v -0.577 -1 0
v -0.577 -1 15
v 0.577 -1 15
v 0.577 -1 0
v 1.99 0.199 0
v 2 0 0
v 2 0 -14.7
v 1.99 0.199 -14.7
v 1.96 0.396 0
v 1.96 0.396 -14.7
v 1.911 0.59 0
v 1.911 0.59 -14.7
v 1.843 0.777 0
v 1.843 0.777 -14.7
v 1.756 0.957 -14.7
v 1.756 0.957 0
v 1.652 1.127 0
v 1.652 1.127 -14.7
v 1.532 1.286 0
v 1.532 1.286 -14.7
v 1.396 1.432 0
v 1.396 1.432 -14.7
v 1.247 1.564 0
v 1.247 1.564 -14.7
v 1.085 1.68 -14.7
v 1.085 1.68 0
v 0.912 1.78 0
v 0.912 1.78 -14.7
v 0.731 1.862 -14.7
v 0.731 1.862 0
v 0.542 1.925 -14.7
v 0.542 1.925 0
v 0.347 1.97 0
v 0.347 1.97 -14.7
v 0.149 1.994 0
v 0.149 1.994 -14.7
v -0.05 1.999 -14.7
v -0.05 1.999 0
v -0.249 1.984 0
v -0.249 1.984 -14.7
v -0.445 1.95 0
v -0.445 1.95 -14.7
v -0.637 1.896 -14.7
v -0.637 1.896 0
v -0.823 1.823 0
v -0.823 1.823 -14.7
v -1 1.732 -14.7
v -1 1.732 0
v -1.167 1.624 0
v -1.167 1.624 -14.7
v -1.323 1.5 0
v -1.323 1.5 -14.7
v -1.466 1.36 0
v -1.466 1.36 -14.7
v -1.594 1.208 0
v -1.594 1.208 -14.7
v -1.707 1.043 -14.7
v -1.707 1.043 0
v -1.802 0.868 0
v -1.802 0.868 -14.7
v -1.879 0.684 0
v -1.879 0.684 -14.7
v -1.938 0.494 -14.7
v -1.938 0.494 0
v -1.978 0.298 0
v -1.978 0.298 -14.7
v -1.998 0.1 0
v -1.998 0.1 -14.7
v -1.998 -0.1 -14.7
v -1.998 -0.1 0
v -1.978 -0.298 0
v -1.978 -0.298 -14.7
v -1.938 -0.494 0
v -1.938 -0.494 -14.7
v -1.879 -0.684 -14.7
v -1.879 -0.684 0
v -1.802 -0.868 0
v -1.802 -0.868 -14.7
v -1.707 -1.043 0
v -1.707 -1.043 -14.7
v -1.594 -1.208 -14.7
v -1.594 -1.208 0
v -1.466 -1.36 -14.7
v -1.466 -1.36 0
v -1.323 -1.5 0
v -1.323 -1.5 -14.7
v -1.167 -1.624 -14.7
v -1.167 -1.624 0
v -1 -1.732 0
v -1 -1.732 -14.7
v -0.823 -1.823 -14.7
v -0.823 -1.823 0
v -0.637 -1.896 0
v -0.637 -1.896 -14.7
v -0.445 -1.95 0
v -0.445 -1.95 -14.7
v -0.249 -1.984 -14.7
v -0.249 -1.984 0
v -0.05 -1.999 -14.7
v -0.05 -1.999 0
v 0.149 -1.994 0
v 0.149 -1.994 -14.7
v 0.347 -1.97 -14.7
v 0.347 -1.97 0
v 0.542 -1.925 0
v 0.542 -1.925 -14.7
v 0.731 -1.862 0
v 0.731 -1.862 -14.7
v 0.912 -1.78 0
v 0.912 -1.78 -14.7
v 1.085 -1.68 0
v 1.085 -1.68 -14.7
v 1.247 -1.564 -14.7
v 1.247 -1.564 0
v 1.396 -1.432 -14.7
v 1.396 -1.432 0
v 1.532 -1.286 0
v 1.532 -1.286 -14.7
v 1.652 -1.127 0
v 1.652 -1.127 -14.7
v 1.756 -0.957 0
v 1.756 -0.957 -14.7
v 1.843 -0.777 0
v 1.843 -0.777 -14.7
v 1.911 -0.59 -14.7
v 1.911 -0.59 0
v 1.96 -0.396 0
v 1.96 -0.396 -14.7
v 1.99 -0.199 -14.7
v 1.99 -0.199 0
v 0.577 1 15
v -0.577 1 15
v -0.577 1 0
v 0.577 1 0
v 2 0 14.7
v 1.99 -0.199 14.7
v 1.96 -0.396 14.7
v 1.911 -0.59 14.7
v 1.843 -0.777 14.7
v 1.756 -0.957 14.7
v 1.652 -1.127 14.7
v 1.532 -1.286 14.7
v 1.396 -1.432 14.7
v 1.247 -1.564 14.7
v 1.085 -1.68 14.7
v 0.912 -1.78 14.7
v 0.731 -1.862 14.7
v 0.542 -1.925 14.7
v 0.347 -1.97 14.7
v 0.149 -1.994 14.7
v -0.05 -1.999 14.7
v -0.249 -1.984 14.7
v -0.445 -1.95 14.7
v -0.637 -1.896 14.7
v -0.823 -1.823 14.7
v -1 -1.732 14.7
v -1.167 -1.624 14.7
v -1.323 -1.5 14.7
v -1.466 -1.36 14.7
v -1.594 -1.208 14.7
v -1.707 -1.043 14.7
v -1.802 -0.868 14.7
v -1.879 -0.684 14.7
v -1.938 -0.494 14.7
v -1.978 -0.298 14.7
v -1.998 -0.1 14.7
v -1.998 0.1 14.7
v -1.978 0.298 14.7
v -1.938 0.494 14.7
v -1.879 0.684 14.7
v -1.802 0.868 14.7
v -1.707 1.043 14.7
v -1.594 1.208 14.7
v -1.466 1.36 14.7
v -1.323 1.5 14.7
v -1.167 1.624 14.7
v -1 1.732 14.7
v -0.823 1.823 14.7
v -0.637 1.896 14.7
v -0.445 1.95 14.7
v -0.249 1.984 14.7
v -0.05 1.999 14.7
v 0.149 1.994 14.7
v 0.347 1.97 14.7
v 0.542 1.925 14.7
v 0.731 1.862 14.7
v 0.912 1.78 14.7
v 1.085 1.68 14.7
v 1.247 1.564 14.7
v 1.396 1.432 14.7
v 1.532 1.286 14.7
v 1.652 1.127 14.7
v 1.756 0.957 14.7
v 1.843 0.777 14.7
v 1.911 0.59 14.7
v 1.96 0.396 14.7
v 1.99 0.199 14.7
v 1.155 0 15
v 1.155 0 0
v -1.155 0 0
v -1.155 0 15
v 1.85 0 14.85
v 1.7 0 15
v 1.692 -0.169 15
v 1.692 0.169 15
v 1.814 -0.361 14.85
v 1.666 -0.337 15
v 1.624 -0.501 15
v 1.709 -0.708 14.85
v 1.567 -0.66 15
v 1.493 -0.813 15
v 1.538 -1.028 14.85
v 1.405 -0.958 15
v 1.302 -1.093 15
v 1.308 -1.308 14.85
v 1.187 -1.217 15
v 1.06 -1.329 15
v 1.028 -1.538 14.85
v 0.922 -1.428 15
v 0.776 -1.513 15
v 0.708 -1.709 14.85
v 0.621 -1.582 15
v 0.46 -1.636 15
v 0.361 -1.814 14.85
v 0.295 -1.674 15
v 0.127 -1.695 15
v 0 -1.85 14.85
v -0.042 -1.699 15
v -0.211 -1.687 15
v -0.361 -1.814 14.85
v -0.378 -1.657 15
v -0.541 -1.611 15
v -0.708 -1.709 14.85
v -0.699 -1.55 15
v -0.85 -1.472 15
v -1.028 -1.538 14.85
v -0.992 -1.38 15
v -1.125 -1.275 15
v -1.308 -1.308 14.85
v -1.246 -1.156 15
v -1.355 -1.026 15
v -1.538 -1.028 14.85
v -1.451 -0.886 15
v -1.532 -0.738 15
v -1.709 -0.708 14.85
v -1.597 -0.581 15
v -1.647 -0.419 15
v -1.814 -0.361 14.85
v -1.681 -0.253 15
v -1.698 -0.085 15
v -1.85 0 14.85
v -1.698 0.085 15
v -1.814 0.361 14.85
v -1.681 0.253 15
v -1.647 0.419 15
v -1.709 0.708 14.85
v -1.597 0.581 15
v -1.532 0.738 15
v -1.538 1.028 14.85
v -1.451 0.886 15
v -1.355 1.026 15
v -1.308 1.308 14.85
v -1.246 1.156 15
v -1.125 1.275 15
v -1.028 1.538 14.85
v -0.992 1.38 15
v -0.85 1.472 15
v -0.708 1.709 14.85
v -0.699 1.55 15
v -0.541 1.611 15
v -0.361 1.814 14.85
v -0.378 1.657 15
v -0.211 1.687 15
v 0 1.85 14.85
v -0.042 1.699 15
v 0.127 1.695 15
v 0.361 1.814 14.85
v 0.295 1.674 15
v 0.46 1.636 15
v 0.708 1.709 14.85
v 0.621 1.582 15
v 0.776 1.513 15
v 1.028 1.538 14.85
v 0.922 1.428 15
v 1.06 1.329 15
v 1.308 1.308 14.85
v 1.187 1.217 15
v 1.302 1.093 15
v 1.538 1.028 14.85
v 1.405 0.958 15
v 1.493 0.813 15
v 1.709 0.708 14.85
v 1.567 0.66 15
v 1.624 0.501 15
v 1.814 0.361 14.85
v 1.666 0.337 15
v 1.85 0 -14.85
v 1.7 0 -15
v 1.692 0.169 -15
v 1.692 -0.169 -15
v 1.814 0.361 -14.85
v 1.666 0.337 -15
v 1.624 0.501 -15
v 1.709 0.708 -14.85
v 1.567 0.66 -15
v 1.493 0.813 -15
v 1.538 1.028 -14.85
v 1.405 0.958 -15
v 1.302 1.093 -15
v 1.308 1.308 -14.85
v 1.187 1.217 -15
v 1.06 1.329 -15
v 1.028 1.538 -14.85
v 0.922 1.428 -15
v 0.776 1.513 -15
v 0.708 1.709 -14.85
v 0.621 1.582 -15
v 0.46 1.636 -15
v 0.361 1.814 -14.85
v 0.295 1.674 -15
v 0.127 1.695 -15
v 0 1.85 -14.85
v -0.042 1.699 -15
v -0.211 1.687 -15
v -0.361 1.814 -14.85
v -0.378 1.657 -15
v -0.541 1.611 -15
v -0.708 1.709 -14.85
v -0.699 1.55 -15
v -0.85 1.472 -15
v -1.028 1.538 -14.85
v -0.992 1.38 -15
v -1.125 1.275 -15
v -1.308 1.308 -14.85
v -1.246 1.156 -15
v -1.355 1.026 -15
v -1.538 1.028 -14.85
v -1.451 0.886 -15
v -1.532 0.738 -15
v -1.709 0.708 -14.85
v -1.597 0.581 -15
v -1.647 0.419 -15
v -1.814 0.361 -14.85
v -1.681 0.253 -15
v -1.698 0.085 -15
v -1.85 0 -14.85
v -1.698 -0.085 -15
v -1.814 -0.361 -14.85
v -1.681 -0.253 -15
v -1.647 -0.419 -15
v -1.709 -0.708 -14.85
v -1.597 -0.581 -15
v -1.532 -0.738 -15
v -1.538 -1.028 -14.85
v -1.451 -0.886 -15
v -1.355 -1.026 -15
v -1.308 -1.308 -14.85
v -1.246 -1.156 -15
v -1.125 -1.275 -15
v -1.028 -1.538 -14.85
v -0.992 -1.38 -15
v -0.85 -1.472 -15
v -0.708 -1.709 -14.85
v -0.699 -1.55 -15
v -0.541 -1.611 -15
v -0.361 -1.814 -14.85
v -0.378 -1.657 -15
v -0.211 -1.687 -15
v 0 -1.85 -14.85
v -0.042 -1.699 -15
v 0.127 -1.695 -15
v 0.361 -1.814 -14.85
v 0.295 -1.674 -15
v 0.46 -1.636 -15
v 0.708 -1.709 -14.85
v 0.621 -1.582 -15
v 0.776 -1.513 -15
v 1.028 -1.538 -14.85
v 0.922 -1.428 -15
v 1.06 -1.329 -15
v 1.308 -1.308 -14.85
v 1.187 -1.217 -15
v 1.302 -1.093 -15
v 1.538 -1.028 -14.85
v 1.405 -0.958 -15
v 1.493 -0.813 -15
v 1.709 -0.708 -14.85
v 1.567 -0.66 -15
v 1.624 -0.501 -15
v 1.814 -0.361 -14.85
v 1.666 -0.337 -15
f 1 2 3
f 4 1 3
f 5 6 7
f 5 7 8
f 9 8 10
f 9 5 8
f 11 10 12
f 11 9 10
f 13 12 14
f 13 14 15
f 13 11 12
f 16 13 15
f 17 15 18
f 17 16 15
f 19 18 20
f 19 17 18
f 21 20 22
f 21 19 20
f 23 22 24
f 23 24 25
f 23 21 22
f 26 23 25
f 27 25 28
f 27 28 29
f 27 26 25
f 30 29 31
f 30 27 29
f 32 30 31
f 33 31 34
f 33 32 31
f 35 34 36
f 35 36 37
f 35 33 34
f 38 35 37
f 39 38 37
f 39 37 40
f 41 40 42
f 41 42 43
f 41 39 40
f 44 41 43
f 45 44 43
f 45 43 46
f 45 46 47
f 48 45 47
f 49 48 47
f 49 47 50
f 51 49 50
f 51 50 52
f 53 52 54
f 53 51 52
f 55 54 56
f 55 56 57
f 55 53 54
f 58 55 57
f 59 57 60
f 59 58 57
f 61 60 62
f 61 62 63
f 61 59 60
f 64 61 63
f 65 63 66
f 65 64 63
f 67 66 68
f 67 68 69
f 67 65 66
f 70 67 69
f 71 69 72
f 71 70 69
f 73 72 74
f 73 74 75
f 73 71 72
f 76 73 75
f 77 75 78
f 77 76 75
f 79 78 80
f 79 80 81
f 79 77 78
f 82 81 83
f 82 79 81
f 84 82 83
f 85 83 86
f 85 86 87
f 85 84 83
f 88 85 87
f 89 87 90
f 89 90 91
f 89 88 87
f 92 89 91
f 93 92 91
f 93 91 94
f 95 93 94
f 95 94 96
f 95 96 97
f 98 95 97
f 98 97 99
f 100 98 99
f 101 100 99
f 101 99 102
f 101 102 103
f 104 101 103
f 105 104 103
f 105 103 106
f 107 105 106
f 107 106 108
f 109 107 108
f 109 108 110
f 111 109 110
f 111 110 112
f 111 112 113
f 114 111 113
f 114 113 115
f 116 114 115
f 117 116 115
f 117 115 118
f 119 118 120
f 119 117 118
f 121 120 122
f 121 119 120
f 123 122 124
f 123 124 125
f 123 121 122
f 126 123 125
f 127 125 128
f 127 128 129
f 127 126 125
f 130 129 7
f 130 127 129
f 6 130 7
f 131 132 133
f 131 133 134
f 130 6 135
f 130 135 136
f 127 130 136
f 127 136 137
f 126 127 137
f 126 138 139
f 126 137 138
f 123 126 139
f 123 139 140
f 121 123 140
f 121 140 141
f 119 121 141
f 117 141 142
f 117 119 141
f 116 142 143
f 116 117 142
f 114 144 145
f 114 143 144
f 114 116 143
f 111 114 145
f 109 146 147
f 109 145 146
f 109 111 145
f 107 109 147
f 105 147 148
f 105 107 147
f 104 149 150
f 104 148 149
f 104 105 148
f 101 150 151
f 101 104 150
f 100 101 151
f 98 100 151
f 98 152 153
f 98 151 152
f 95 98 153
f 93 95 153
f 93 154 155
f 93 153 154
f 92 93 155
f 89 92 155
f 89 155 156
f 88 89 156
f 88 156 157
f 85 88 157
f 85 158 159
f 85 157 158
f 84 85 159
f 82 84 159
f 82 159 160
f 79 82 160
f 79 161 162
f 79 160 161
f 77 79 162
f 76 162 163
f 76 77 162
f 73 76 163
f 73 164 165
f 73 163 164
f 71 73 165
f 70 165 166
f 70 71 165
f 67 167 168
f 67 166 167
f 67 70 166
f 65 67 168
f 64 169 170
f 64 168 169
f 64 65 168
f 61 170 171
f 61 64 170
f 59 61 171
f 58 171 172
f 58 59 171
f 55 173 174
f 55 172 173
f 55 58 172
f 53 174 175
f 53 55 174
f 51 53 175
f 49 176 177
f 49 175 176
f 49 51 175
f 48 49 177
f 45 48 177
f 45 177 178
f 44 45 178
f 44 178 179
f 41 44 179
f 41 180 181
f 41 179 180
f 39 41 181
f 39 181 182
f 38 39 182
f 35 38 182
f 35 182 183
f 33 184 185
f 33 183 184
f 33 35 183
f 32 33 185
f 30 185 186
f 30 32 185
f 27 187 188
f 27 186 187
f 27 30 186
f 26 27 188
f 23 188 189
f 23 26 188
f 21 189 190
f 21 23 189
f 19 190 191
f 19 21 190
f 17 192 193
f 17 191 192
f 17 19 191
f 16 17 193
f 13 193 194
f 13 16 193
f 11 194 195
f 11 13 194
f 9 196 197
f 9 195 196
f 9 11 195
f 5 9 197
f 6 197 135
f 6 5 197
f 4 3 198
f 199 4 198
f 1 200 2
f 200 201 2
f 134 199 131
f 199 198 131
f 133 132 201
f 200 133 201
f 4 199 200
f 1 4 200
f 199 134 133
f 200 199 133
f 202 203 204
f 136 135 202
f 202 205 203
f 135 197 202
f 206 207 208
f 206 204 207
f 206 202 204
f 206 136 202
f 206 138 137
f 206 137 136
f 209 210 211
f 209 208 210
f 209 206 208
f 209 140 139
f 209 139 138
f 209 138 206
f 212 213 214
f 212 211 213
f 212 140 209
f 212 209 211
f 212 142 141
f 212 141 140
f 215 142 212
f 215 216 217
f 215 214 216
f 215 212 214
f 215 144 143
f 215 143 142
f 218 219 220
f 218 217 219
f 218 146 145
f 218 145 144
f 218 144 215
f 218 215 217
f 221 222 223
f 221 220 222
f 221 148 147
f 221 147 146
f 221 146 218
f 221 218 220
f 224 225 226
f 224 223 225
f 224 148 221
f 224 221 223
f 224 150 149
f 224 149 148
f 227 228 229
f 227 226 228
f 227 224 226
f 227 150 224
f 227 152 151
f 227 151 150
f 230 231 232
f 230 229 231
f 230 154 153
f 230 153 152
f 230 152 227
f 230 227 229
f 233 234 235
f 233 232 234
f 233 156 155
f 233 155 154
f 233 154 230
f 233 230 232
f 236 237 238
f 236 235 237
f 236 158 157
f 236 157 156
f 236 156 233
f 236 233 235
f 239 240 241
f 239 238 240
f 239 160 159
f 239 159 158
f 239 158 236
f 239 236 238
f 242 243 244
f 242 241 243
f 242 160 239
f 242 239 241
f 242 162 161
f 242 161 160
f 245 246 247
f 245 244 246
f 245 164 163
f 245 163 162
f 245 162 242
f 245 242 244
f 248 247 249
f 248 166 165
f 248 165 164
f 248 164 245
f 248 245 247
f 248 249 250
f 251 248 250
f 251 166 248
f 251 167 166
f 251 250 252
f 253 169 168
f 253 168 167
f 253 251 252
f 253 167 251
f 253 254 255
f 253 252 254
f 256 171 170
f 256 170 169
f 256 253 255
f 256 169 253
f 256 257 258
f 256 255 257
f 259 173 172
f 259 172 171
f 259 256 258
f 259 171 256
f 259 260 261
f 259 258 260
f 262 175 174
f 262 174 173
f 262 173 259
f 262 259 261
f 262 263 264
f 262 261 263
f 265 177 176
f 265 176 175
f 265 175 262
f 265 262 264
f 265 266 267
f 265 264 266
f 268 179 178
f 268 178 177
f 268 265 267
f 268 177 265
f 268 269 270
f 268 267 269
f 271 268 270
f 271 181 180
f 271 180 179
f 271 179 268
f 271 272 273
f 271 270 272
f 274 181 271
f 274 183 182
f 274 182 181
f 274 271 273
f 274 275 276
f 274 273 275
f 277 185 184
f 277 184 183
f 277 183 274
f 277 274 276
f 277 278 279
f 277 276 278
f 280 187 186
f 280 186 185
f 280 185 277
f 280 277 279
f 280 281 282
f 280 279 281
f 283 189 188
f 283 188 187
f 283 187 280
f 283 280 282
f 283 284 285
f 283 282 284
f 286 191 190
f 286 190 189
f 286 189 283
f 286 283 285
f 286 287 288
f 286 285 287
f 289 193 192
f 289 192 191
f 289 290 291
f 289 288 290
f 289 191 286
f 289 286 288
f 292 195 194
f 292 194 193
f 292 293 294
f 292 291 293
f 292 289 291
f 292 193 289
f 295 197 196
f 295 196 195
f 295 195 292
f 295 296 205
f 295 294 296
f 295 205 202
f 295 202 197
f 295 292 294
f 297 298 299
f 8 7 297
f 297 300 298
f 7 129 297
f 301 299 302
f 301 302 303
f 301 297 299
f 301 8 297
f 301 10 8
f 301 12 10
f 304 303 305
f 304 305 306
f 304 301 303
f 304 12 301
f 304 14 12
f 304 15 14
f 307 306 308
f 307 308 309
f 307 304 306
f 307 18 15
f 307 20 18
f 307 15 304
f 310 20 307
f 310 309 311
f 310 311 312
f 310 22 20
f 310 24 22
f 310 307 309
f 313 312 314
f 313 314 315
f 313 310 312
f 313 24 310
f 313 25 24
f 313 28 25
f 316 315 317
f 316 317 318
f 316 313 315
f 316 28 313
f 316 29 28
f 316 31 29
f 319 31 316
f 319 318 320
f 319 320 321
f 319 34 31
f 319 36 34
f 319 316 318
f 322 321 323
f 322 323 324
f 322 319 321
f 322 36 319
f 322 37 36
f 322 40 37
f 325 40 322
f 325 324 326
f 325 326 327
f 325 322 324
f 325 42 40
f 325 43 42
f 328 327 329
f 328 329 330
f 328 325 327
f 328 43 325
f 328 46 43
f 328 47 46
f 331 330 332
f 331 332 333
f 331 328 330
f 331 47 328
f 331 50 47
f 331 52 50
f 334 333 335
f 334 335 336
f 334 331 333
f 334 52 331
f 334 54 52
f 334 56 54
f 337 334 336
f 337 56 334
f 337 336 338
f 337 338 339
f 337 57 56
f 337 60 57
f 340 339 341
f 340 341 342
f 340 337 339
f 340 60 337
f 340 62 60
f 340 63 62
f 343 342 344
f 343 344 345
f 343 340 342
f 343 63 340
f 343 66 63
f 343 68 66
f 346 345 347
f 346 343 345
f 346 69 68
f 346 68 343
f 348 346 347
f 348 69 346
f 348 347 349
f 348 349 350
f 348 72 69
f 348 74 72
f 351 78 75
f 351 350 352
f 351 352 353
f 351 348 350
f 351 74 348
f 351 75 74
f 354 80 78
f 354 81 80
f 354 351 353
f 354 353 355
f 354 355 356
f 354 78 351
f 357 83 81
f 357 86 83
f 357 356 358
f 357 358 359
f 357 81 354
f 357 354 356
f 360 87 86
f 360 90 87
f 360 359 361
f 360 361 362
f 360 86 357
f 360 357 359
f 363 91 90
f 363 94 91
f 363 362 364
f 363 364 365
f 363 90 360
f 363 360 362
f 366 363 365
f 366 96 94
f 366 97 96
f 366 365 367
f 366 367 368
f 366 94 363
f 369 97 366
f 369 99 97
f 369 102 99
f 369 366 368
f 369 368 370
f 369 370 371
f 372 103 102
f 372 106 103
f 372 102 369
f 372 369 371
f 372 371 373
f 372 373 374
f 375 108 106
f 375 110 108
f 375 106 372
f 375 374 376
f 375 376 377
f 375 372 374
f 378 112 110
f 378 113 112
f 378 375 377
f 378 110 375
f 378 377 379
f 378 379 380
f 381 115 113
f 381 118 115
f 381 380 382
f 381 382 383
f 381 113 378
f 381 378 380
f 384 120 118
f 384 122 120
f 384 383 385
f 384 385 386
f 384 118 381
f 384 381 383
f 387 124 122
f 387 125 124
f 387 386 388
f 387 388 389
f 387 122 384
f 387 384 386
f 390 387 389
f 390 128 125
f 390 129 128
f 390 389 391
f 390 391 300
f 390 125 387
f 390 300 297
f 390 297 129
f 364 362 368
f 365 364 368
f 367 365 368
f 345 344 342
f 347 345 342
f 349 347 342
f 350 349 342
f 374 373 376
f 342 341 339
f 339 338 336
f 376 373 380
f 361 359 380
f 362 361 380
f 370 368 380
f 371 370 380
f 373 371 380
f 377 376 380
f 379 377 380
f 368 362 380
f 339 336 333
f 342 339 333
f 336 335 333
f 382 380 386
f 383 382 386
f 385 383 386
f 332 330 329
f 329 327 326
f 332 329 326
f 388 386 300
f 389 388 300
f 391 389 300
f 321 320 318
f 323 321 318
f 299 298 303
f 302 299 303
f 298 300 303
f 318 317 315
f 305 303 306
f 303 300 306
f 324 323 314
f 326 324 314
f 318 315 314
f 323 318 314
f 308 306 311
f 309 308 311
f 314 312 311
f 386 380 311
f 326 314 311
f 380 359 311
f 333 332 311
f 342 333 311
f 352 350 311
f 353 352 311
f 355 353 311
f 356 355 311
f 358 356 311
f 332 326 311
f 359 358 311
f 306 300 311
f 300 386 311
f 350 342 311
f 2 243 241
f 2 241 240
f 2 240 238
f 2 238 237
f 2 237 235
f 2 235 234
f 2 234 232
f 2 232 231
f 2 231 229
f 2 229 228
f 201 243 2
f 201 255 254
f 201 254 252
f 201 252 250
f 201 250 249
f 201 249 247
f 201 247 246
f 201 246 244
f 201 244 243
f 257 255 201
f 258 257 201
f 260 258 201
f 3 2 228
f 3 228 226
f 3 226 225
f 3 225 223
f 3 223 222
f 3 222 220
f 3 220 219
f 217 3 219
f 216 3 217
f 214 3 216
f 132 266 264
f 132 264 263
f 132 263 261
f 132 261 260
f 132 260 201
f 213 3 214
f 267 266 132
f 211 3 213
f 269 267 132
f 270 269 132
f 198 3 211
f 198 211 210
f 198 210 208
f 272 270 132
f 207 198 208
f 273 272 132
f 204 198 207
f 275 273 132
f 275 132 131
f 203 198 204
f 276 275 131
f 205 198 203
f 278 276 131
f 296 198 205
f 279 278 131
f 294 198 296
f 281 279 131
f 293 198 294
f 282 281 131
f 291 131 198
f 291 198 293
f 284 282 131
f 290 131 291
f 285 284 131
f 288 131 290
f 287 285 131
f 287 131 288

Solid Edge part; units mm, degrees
sketch "Sketch1" plane through (0, 0, 0) normal (0, 0, 1) x (1, 0, 0)
  circle A0 centre (0, 0) radius 2
  dimension "D1" = 4
extrude "Protrusion1" add sketch "Sketch1" along normal mid plane 30
chamfer "Chamfer1" distance 0.3 angle 45 2 edges at (-2, 0, -15) (-2, 0, 15)
sketch "Sketch2" plane through (0, 0, 15) normal (0, 0, 1) x (1, 0, 0)
  line L0 (-0.5774, 1) -> (0.5774, 1)
  line L1 (1.1547, 0) -> (0.5774, 1)
  line L2 (0.5774, -1) -> (1.1547, 0)
  line L3 (-0.5774, -1) -> (0.5774, -1)
  line L4 (-1.1547, 0) -> (-0.5774, -1)
  line L5 (-0.5774, 1) -> (-1.1547, 0)
  dimension "D1" = 2
extrude "Cutout1" cut sketch "Sketch2" against normal blind 15
properties part number "24100097"
